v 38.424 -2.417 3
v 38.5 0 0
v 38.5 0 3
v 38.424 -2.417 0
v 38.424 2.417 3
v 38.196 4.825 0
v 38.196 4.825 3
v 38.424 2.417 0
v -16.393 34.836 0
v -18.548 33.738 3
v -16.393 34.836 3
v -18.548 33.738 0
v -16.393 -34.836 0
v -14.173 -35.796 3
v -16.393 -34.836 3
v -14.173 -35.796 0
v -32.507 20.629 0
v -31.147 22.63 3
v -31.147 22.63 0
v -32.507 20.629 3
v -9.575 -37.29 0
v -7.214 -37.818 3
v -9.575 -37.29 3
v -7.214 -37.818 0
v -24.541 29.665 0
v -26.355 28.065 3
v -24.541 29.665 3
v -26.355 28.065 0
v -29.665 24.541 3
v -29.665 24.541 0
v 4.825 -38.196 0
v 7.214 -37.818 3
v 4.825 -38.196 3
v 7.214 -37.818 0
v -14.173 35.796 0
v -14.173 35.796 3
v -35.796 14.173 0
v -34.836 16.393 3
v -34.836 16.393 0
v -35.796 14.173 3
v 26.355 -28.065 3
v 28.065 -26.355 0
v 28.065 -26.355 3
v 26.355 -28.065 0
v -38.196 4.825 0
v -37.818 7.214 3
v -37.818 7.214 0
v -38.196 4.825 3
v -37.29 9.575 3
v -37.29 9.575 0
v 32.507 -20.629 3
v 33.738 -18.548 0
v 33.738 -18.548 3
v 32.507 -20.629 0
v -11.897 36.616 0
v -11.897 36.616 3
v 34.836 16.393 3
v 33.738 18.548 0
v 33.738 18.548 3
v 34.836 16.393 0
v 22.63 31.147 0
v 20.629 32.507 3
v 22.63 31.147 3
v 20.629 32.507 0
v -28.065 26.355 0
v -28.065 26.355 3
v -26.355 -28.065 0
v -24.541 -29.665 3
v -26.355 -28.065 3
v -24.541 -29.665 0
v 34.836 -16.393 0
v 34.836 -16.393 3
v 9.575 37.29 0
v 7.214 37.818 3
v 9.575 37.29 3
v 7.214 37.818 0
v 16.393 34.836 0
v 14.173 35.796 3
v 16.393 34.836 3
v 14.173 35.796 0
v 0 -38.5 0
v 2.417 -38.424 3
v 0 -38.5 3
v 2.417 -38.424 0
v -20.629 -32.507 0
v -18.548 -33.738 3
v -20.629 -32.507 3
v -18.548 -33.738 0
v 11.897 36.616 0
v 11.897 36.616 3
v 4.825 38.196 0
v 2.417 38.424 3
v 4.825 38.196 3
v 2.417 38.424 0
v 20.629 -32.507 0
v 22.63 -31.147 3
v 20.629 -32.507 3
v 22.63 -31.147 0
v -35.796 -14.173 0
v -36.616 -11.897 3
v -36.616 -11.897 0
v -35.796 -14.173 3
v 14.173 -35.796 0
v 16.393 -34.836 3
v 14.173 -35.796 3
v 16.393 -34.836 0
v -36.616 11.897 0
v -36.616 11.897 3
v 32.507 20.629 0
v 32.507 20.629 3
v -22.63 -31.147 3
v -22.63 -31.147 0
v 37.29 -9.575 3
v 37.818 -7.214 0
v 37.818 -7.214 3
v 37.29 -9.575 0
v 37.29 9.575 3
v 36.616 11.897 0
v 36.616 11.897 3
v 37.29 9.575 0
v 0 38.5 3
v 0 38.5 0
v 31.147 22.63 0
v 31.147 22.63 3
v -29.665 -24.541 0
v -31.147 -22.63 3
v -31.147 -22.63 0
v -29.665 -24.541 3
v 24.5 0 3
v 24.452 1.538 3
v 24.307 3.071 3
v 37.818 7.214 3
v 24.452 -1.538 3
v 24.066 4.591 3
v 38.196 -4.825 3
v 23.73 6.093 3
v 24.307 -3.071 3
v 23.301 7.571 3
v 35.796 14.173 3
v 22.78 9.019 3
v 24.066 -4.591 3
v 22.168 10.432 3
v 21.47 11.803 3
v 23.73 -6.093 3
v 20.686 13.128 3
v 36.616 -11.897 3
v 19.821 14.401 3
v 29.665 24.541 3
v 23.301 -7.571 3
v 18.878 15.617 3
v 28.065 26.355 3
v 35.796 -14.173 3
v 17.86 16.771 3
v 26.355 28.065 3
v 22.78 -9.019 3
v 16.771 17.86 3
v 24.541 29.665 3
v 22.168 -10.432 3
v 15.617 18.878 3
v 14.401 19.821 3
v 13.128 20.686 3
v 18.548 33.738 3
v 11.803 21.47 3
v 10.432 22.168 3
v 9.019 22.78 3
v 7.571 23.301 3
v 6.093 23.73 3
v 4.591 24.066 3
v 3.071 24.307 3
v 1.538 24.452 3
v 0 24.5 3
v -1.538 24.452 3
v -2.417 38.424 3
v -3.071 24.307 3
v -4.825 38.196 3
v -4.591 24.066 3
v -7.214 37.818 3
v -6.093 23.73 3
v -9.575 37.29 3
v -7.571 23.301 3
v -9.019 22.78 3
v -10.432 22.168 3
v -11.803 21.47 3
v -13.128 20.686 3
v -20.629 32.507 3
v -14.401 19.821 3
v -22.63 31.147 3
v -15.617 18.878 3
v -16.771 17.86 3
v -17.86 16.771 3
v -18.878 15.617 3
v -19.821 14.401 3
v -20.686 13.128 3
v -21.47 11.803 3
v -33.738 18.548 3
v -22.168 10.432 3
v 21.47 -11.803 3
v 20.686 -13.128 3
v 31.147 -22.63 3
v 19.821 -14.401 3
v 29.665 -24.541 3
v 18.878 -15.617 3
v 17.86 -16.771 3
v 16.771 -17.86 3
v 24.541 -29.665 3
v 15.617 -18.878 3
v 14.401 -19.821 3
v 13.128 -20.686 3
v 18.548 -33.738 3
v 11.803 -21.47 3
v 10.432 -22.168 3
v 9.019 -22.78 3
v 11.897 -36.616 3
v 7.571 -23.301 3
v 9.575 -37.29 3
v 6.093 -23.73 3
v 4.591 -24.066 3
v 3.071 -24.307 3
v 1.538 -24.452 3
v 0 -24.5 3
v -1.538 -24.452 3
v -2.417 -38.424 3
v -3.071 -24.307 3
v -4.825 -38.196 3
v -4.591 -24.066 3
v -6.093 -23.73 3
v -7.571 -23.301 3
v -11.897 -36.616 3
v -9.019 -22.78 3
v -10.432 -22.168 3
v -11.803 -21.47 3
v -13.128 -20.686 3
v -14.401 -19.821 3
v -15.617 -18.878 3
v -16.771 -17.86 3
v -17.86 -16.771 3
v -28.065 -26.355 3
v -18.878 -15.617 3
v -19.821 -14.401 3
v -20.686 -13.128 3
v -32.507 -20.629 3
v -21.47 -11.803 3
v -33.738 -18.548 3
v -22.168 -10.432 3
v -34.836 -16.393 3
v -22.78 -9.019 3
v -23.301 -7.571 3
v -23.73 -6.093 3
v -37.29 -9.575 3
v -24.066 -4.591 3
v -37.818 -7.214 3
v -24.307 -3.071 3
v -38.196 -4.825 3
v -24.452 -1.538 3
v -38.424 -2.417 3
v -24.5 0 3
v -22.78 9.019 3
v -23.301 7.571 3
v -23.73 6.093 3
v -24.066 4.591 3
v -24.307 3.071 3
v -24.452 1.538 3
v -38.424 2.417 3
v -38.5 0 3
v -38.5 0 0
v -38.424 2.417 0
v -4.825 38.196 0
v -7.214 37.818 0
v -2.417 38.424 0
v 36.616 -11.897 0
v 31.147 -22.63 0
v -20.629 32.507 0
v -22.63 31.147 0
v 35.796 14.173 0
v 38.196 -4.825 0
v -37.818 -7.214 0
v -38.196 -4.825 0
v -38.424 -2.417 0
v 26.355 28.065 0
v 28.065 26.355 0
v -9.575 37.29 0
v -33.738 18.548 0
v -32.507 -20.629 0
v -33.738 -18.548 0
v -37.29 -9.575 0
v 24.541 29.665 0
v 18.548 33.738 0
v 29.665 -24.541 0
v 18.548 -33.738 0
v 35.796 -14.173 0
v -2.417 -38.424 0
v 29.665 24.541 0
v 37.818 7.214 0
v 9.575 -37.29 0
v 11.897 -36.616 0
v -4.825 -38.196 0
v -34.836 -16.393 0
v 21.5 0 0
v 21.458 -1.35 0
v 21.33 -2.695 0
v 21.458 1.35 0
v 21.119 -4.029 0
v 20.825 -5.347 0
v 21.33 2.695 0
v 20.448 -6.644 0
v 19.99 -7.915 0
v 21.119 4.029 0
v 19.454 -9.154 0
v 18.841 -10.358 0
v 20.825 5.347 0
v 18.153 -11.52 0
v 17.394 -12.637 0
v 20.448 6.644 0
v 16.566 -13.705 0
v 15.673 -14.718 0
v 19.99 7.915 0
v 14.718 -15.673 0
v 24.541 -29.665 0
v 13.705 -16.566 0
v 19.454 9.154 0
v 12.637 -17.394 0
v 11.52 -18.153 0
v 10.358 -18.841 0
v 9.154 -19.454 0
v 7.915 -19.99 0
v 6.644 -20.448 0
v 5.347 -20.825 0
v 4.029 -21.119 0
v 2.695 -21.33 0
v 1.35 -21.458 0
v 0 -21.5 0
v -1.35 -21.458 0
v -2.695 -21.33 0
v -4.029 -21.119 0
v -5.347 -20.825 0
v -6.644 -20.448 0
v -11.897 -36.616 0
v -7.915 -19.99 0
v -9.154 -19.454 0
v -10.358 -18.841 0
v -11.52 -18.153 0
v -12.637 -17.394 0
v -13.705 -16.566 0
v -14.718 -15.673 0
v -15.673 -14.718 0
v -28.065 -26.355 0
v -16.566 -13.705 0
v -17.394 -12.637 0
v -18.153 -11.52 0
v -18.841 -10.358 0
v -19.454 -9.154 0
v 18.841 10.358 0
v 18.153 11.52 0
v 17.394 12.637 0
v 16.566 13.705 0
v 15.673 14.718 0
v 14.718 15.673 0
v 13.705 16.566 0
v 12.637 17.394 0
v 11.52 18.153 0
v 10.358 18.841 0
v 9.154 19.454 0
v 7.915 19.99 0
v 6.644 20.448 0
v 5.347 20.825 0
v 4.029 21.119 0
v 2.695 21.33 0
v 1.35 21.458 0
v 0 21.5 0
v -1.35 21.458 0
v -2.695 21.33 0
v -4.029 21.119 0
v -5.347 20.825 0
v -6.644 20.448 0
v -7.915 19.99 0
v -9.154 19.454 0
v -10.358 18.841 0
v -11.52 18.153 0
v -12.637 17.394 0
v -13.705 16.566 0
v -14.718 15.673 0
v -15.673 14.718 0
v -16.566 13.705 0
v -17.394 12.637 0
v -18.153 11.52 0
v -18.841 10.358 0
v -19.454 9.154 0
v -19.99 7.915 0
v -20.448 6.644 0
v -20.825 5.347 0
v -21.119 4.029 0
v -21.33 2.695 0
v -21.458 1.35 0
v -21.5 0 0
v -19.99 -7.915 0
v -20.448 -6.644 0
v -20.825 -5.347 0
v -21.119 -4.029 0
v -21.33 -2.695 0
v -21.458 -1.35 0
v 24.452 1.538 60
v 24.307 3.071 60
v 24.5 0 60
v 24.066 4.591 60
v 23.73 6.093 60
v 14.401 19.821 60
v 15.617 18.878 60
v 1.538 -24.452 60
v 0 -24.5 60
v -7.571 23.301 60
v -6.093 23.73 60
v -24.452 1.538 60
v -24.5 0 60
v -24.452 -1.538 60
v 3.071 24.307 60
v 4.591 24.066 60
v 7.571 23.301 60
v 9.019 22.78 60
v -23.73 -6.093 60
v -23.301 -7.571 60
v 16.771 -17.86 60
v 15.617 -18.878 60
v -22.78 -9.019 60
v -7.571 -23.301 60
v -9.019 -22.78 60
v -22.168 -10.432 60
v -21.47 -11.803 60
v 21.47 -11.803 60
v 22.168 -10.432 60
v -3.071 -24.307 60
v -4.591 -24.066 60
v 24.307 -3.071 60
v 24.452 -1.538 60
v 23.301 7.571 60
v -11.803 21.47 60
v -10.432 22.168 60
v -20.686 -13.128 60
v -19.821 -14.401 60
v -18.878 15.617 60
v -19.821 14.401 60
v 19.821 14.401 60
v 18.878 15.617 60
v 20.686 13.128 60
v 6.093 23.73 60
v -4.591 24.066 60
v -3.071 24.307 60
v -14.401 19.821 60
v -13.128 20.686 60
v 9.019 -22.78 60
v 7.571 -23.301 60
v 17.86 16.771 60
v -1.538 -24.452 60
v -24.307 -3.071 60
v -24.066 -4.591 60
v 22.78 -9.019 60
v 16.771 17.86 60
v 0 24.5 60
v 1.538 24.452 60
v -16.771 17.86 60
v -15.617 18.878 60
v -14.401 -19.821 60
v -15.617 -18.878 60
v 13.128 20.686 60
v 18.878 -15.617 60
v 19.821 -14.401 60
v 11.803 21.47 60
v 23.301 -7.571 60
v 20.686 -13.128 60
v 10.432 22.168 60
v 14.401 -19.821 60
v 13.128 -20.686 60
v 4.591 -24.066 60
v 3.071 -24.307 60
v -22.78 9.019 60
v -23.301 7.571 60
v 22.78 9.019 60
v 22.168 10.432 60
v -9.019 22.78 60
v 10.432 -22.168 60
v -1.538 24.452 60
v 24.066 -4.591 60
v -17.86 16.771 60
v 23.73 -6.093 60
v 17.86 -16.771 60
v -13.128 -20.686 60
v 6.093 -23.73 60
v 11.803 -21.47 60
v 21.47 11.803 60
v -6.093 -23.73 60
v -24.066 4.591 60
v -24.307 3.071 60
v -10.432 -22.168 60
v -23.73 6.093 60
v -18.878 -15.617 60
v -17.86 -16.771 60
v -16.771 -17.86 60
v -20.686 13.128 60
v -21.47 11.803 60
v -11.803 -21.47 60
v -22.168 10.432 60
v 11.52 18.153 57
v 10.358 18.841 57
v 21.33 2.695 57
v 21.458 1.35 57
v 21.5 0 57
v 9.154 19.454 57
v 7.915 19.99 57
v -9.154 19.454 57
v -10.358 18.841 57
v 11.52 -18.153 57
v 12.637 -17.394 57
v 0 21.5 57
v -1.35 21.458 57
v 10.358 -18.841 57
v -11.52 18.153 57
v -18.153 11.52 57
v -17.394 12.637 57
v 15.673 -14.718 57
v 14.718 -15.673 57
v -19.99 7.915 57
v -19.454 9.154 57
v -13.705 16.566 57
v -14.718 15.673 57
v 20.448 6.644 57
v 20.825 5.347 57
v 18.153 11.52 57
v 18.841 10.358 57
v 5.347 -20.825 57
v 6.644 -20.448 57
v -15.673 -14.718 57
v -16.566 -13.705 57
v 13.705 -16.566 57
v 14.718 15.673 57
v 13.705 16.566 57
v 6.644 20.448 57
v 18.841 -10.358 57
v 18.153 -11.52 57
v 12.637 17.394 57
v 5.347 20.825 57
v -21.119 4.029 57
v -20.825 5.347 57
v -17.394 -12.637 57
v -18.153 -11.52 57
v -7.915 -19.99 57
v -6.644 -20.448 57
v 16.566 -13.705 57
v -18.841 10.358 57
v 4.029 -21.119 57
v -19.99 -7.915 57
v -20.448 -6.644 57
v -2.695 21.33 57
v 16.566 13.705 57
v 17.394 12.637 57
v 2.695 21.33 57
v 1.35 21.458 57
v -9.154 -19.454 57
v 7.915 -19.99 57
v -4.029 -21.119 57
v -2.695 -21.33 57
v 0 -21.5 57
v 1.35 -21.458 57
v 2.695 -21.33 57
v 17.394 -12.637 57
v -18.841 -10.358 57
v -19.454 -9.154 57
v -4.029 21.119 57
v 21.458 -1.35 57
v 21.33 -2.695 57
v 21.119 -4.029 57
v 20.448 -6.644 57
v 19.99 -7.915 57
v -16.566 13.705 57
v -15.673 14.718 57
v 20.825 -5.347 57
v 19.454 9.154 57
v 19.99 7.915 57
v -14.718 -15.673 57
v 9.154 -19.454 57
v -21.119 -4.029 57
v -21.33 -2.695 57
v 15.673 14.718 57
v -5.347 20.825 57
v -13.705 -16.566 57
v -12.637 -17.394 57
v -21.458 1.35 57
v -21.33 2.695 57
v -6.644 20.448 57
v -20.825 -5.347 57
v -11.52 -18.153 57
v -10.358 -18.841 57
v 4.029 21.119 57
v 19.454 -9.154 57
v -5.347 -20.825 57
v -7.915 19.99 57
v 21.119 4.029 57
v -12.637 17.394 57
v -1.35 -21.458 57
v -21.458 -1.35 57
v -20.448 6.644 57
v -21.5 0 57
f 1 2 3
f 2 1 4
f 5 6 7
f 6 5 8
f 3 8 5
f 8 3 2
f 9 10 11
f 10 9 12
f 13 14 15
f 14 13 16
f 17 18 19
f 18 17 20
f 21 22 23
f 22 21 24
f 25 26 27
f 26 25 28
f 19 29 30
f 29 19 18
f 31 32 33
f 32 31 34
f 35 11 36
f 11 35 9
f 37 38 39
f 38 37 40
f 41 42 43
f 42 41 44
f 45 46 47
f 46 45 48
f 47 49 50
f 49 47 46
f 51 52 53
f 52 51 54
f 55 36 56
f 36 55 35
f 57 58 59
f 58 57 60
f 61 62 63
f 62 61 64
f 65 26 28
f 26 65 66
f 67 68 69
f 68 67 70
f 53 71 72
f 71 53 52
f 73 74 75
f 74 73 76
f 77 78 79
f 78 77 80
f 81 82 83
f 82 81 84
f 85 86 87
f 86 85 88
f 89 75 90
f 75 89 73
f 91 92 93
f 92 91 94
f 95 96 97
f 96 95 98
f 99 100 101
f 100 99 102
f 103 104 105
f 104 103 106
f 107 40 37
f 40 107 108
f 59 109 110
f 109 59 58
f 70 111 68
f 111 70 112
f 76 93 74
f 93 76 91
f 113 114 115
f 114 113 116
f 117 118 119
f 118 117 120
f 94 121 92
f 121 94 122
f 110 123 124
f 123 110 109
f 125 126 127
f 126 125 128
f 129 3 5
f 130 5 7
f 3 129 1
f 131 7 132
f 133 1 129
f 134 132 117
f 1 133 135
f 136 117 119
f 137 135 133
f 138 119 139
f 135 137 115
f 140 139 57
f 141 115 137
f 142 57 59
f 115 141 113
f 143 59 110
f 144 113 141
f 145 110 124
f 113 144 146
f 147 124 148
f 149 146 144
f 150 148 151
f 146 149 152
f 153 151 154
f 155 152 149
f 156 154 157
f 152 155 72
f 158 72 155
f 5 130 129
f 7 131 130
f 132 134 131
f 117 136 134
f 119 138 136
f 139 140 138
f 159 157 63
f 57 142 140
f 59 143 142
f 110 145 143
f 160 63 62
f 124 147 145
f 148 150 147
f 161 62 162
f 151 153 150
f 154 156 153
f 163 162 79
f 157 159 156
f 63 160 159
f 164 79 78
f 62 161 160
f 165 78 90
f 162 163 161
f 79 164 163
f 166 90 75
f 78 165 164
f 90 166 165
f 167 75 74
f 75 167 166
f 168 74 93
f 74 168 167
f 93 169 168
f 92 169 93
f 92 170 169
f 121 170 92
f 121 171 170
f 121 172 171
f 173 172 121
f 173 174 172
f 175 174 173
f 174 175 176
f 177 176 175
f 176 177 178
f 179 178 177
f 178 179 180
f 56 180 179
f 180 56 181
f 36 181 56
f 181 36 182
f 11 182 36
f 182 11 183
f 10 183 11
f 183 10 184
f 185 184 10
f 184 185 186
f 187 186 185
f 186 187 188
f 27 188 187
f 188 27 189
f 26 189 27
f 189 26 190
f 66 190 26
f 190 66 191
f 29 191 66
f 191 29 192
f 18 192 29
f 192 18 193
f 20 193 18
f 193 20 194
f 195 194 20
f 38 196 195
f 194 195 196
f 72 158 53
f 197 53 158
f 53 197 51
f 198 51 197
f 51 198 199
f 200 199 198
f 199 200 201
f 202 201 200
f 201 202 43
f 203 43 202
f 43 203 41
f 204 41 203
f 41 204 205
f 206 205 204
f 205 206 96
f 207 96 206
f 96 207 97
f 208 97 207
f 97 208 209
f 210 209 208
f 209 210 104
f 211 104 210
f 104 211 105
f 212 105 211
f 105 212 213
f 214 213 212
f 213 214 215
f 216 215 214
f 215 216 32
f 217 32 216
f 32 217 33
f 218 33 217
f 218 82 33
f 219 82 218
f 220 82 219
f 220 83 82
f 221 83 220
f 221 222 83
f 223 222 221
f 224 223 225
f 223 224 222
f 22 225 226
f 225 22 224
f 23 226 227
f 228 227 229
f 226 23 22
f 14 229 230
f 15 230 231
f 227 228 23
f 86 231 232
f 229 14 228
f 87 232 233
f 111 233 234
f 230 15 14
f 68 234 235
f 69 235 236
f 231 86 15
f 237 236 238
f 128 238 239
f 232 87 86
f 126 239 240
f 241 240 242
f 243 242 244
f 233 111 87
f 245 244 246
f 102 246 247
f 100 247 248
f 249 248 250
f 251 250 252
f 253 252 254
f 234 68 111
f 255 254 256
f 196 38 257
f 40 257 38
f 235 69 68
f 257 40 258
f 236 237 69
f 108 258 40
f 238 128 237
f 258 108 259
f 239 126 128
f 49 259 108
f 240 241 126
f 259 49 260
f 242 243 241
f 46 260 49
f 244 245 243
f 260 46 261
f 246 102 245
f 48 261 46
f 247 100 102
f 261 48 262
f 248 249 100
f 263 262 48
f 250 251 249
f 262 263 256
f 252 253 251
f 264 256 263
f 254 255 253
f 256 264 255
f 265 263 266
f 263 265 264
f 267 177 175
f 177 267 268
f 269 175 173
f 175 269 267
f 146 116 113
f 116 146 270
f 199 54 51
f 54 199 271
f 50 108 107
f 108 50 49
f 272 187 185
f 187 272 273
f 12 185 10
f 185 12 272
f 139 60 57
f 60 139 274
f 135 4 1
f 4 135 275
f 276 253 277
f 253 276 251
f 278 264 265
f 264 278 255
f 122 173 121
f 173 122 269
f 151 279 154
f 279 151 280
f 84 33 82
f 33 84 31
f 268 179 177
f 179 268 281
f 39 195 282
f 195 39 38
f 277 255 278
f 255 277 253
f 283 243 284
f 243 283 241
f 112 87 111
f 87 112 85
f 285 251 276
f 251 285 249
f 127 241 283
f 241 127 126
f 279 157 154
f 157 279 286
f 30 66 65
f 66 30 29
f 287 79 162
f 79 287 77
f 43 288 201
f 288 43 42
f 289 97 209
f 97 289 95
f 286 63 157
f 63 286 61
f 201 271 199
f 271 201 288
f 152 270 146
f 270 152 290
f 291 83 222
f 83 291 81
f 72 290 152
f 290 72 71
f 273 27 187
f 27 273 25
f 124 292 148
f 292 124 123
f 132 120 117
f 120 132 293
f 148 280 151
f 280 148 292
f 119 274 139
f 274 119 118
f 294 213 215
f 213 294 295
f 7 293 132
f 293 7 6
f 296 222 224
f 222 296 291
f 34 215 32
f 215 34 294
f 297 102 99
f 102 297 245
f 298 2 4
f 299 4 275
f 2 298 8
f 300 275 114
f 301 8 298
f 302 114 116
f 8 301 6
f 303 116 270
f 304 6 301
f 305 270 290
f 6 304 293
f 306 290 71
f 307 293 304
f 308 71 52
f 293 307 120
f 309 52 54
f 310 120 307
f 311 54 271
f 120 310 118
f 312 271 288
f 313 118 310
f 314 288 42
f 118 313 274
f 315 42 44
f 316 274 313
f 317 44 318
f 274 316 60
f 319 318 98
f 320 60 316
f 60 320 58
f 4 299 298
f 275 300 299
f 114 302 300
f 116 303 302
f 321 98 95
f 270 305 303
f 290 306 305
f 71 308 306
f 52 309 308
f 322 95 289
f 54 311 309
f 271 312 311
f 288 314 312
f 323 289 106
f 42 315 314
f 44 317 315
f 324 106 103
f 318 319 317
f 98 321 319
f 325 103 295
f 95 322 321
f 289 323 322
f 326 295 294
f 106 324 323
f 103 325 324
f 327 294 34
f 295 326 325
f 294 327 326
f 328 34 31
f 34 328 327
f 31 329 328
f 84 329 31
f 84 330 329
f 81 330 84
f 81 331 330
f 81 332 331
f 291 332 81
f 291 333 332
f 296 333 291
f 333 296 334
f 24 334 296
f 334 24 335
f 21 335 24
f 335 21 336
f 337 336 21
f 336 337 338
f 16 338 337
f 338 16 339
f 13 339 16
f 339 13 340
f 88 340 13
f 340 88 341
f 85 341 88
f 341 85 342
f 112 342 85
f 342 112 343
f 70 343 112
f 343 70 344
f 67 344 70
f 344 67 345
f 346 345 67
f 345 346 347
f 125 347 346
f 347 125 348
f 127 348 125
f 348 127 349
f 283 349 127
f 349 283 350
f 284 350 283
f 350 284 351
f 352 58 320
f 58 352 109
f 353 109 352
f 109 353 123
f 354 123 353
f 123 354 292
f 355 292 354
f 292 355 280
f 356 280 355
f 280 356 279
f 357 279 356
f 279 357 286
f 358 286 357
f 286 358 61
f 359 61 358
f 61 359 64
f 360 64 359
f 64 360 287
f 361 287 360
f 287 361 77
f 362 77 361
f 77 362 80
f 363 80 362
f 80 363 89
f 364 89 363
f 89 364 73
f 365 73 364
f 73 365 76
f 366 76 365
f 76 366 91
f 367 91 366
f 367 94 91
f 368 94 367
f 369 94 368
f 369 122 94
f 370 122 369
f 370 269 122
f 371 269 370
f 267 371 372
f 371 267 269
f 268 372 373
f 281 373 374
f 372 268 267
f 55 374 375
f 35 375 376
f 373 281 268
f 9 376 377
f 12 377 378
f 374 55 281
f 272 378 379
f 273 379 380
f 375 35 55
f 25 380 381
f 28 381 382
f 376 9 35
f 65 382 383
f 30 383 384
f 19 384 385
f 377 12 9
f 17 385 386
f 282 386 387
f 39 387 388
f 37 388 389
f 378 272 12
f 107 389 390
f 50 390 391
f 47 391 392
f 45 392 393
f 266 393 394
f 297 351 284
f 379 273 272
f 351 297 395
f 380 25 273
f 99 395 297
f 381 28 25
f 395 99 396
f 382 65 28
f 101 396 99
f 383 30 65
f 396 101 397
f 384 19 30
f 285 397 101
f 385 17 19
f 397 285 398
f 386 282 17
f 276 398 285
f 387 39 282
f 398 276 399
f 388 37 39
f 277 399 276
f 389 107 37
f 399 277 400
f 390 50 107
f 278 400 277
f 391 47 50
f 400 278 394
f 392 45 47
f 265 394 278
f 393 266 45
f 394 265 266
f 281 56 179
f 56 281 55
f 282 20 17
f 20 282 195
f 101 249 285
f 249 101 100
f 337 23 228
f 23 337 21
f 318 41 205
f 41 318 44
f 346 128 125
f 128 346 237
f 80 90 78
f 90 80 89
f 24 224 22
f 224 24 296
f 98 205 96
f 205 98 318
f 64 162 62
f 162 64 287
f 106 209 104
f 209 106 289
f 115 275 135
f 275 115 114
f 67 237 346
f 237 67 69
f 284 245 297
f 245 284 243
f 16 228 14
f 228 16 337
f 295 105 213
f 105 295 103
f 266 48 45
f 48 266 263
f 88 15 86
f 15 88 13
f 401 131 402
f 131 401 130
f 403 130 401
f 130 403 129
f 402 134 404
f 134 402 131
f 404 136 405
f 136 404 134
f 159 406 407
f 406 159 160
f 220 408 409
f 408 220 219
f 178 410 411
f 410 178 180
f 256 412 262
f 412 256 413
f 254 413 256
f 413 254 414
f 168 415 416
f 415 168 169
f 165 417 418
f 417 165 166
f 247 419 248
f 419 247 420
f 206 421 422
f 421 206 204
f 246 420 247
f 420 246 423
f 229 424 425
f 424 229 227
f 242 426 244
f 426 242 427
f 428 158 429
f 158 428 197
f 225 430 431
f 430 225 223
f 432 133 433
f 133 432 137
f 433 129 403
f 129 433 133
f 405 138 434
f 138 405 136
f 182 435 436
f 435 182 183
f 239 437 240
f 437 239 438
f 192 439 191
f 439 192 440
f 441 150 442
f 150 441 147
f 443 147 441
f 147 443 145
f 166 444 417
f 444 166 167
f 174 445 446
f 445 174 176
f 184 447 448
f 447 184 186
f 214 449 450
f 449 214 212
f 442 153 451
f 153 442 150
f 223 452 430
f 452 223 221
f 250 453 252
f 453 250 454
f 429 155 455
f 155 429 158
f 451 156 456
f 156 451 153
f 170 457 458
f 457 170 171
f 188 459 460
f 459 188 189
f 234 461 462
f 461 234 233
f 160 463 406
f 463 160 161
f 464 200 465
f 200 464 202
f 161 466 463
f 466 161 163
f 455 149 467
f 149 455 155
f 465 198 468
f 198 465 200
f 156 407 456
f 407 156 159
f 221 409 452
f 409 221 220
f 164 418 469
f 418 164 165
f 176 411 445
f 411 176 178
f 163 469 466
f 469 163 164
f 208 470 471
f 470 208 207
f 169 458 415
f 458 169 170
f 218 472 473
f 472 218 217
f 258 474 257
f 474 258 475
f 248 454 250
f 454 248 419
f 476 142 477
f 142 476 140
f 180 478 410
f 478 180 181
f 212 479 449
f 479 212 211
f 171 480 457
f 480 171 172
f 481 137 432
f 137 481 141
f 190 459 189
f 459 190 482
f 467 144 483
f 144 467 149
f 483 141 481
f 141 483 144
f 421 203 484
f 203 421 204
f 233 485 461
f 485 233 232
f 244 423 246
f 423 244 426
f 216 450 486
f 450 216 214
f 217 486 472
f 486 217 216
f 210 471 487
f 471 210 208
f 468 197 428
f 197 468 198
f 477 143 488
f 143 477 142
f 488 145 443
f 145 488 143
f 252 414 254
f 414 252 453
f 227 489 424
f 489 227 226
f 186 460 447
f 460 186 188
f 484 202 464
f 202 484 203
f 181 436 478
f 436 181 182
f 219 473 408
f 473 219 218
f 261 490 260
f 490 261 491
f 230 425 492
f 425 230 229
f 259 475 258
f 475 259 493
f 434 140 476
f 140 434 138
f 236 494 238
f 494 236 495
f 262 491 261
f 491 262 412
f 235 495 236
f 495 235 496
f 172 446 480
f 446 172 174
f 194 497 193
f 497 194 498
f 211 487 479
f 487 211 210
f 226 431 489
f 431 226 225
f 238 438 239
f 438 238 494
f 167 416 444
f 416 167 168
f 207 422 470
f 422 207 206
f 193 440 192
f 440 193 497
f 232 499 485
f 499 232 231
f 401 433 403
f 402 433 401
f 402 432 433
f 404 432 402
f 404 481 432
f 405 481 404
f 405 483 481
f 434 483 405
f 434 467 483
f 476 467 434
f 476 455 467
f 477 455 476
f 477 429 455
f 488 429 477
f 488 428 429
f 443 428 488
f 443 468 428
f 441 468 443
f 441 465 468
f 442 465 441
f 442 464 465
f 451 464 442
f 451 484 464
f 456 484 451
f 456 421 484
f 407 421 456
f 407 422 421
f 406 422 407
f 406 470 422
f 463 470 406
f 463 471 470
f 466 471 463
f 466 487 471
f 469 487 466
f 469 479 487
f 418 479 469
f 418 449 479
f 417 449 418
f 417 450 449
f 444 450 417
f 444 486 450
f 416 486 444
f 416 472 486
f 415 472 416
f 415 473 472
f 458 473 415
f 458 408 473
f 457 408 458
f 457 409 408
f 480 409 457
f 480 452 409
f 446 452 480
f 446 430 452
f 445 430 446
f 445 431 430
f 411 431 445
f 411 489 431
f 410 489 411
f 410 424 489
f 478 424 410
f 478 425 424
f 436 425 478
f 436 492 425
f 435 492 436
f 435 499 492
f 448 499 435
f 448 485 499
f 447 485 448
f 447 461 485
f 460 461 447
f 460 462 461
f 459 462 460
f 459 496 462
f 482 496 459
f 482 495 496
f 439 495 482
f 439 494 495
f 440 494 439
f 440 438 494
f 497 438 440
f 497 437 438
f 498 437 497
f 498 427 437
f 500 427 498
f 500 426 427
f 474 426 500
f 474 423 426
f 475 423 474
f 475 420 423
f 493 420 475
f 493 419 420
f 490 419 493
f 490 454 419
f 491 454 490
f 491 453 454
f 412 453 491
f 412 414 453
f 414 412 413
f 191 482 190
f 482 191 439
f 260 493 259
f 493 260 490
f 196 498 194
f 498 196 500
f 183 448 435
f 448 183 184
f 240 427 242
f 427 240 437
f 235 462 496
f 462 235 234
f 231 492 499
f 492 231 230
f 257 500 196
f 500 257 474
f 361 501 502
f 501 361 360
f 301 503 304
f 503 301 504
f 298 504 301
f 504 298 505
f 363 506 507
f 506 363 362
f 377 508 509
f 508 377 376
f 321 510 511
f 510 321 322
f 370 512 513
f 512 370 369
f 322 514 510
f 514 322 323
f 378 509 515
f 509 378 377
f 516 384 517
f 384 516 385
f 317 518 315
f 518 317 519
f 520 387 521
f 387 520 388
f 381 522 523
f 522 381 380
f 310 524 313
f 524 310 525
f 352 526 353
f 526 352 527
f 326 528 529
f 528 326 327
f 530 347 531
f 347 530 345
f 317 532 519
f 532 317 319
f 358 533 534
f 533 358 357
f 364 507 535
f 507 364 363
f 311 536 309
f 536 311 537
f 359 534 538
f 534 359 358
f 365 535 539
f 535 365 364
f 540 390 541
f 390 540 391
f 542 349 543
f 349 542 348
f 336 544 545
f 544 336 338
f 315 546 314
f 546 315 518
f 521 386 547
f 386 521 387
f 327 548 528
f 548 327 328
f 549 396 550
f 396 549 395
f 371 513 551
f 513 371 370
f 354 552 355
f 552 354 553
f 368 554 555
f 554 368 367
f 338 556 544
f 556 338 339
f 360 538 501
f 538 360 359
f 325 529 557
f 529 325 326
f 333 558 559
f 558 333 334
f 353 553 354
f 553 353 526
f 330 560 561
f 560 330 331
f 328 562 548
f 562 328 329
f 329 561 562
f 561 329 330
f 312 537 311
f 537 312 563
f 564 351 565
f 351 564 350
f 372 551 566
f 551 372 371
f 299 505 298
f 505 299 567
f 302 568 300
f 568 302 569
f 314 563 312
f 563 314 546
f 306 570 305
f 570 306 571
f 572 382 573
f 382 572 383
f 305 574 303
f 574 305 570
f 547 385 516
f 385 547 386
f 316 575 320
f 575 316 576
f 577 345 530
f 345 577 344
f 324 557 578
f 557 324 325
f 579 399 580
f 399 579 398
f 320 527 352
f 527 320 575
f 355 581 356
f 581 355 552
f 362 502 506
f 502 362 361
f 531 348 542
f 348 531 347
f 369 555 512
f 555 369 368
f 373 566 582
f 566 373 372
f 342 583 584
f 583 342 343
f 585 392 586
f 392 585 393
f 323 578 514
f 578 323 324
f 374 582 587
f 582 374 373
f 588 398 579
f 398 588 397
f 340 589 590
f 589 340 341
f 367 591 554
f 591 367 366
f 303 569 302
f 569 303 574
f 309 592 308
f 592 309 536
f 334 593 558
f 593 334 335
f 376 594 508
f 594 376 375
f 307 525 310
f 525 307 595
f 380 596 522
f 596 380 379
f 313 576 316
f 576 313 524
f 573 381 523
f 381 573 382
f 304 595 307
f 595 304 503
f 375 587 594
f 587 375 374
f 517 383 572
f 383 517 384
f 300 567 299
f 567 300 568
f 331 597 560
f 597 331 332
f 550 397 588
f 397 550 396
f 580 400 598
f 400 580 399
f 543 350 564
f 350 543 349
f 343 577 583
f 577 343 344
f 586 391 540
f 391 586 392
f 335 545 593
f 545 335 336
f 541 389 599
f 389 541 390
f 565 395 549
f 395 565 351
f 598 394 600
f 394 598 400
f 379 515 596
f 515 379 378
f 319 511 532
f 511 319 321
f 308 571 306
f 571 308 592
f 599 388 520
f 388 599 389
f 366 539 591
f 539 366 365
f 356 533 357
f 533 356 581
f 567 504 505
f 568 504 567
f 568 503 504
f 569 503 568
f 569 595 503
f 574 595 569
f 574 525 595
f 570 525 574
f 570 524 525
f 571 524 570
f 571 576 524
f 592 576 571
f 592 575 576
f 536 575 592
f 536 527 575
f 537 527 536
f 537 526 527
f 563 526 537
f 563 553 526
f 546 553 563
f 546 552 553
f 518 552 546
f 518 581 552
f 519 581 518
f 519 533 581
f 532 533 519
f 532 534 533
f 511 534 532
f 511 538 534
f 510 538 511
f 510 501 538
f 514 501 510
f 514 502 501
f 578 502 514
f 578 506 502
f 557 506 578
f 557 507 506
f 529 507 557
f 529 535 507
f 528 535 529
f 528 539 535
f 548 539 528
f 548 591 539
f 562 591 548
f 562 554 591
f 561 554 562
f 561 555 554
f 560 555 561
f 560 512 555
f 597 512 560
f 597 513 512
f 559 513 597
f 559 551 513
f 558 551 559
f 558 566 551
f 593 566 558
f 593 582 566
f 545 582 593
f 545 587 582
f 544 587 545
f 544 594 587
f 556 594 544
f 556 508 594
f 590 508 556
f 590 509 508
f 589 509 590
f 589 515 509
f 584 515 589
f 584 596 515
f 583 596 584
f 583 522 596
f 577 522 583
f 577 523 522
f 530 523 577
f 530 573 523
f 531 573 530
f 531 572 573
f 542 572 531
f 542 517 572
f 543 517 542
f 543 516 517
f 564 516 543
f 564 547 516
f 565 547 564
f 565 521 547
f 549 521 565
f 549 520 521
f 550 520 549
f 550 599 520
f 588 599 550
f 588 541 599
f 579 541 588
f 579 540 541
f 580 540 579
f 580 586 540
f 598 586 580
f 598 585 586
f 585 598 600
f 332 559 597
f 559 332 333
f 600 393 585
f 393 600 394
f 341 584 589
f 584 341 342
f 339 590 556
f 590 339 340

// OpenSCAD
$fn = 100;
radius = 43/2;
height = 60;
wallThickness = 3;

module positiveVolumes()
{
   //Brim
    brimExtraRadius = 14;
    cylinder
    (
        wallThickness,
        radius + brimExtraRadius + wallThickness,
        radius + brimExtraRadius + wallThickness,
        center = false
    );

    //Main body of hat
    cylinder
    (
        height,
        radius + wallThickness,
        radius + wallThickness,
        center = false
    );
}

module hat()
{
    difference()
    {
        positiveVolumes();

        //remove interior of hat
        translate
        (
            [
                0,
                0,
                -1
            ]
        )
        {
            cylinder
            (
                height - wallThickness + 1,
                radius,
                radius,
                center = false
            );
        }
    }
}

module main()
{
    rotate(a=[0,0,0])
    {
        hat();
    }
}

main();
